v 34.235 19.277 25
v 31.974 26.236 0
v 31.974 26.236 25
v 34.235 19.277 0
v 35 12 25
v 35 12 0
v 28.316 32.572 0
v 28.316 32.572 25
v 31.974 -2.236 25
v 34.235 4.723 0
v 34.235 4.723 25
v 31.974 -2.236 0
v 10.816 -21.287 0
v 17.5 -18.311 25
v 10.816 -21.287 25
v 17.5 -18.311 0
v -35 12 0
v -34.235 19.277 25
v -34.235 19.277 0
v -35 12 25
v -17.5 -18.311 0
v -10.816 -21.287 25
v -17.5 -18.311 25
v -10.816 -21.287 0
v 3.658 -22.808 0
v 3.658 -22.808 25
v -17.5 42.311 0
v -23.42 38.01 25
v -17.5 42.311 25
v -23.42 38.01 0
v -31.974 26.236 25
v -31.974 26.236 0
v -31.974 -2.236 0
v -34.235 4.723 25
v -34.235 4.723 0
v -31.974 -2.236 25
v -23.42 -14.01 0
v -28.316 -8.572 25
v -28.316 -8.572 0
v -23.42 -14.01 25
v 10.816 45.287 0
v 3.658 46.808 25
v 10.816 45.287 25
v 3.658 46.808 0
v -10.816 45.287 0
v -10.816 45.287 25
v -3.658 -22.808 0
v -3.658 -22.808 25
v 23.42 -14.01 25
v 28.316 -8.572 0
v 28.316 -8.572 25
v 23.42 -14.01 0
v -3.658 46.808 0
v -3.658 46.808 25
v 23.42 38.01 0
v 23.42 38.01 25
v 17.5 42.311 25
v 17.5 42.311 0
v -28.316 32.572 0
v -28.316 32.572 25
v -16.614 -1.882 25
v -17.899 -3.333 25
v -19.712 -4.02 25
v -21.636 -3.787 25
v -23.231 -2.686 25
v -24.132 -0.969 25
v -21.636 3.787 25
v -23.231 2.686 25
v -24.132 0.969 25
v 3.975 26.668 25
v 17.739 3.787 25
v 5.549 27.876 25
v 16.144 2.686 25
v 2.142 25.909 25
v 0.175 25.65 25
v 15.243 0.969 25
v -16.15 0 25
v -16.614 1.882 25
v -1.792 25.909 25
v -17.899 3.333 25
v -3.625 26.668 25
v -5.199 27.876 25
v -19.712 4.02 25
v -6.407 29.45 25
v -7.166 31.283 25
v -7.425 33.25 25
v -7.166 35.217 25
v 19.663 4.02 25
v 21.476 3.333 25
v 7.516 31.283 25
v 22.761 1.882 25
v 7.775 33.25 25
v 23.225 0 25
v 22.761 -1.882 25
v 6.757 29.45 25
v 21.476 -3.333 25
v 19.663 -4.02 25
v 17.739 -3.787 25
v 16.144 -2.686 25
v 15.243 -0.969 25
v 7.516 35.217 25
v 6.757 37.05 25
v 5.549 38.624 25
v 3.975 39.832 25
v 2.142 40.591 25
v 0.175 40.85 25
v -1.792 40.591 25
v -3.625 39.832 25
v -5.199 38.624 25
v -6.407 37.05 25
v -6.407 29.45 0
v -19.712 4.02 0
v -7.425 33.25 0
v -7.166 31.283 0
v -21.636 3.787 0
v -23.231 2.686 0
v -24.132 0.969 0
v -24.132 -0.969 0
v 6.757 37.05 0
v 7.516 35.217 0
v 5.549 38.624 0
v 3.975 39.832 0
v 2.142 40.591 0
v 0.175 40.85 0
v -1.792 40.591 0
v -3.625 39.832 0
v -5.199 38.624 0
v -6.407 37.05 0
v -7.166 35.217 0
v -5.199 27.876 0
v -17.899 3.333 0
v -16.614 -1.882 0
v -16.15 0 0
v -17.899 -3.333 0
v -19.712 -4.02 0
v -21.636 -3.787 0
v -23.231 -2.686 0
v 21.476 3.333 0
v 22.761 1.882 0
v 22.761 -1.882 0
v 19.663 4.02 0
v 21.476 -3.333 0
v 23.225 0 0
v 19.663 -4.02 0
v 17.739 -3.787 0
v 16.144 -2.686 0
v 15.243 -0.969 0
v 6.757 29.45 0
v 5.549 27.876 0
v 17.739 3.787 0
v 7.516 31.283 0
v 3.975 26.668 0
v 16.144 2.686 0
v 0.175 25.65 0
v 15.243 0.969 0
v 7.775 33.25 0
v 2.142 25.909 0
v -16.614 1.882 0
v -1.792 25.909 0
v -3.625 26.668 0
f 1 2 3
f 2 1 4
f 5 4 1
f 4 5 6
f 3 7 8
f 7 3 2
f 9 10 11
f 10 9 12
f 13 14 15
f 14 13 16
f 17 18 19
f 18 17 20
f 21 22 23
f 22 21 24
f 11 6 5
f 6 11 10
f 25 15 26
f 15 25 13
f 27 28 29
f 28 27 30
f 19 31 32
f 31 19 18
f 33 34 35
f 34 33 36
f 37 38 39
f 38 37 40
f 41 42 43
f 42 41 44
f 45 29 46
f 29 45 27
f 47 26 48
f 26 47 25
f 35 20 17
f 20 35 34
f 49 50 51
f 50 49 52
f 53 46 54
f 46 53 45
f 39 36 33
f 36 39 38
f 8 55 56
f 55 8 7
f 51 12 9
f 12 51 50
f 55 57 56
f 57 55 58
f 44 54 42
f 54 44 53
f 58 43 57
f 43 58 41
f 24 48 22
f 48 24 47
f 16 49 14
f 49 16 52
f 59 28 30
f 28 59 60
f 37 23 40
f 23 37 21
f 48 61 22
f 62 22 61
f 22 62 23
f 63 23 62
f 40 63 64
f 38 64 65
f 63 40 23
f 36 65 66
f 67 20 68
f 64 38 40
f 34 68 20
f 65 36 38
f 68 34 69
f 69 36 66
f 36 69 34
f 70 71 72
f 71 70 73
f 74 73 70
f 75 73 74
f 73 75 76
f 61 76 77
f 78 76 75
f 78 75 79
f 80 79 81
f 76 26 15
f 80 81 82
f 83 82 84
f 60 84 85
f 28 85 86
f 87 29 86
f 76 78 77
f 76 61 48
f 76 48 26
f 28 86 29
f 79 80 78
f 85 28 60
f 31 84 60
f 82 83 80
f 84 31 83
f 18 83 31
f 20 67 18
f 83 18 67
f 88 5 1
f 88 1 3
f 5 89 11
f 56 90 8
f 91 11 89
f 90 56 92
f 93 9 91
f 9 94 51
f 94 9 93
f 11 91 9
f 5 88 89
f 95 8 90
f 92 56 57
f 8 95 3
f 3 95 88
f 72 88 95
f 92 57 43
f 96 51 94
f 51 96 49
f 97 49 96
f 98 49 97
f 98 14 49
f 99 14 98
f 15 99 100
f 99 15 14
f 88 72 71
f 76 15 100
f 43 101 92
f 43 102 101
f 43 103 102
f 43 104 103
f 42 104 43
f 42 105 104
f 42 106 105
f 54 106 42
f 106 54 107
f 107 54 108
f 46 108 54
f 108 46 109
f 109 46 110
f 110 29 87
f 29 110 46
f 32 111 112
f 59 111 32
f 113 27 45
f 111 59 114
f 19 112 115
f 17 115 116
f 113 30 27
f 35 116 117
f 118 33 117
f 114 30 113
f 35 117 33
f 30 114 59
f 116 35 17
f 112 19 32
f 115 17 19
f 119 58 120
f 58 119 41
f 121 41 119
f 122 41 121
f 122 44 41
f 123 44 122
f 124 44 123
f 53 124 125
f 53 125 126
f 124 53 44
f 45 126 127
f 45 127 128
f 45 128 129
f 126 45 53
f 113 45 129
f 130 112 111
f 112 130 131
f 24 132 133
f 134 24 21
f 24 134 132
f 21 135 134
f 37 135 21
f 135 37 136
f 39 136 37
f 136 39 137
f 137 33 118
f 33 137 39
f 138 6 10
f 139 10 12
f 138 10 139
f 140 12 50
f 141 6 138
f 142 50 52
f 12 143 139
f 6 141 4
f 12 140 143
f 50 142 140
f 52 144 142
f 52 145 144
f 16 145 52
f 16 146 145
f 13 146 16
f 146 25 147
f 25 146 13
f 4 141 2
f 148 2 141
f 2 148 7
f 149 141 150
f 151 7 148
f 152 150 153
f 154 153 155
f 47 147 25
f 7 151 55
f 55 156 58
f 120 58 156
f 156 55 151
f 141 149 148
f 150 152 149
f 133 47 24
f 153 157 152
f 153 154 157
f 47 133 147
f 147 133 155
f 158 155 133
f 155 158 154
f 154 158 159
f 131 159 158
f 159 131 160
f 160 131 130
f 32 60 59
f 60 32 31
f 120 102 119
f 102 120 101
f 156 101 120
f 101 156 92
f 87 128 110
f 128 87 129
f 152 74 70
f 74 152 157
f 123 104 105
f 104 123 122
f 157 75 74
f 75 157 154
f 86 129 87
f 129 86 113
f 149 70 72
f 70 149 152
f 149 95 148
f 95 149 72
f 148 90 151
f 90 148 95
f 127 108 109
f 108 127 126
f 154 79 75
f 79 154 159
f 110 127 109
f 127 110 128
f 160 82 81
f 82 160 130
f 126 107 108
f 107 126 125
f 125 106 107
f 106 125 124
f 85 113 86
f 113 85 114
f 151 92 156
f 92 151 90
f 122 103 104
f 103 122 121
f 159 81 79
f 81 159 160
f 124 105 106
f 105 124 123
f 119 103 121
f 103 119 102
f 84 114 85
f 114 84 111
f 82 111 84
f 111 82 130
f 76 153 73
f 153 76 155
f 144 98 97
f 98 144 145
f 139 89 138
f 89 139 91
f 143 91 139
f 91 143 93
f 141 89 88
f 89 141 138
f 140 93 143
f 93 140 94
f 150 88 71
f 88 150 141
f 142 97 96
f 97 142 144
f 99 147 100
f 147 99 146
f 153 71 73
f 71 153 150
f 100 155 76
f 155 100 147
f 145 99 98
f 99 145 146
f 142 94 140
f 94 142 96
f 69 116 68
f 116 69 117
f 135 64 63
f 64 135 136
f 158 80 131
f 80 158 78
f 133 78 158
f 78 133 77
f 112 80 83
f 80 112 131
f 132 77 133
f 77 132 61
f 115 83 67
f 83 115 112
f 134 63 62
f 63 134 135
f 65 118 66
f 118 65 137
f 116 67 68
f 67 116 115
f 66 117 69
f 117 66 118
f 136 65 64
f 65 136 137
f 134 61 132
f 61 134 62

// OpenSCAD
echo(version=version());

// units in mm
BASE_WIDTH = 113.0;
BASE_HEIGHT = 53.0;
BASE_WALL = 4.0;
INNER_RIDGE_HEIGHT = 6.0;
INNER_RIDGE_WIDTH = 2.0;

PLATFORM_WIDTH = 100.0;
PLATFORM_HEIGHT = 4.0;

SUPPORT_WIDTH = BASE_WIDTH - INNER_RIDGE_WIDTH * 4;
SUPPORT_HEIGHT = 20.0;

ROD_WIDTH = 8.1; // m8 
ROD_DEPTH = 10.0;
ROD_PLACEMENT = (BASE_WIDTH - INNER_RIDGE_WIDTH * 4) / 4;

ROD_SHAFT_HEIGHT = 2 * ROD_WIDTH + 4;
ROD_SHAFT_WIDTH = ROD_WIDTH + 4;

STEPPER_ROD_NUT_WIDTH = 13.0;
STEPPER_ROD_HEIGHT = ROD_SHAFT_HEIGHT;
STEPPER_ROD_NUT_WALL = STEPPER_ROD_NUT_WIDTH + 4;

// stepper dims
STEPPER_WIDTH = 42.3;
STEPPER_HEIGHT = 33.0;
STEPPER_SCREW_SPACE = 31.0; 
STEPPER_HALF_SPACE = STEPPER_SCREW_SPACE / 2;
STEPPER_SCREW_SIZE = 3.1; // m3
STEPPER_SHAFT = 7.0;
STEPPER_HOUSING_WIDTH = STEPPER_WIDTH + BASE_WALL * 2;
STEPPER_HOUSING_DEPTH = STEPPER_HEIGHT;

BEARING_HEIGHT = 25.0;
BEARING_WIDTH = 15.2;

// middle support
difference() {
    translate([0, 12, 0]) {        
        cylinder(h=BEARING_HEIGHT, d=70);
    }
    
    translate([-1 * ROD_PLACEMENT + ROD_SHAFT_WIDTH + 1.75 + -1 * STEPPER_HOUSING_WIDTH / 4 + STEPPER_HOUSING_WIDTH / 2, 
              ROD_SHAFT_HEIGHT + STEPPER_HOUSING_WIDTH / 2 - ROD_SHAFT_WIDTH, 
              0]) {
        // stepper shaft
        cylinder(h=BEARING_HEIGHT, d=BEARING_WIDTH);
    }
    
    // middle support
    translate([ROD_PLACEMENT / 2 + ROD_SHAFT_WIDTH / 2, 0, 0]) {
        cylinder(h=BEARING_HEIGHT, d=ROD_WIDTH);
    }

    translate([-1 * ROD_PLACEMENT + ROD_SHAFT_WIDTH / 2, 0, 0]) {
        cylinder(h=BEARING_HEIGHT, d=ROD_WIDTH);
    }
}
